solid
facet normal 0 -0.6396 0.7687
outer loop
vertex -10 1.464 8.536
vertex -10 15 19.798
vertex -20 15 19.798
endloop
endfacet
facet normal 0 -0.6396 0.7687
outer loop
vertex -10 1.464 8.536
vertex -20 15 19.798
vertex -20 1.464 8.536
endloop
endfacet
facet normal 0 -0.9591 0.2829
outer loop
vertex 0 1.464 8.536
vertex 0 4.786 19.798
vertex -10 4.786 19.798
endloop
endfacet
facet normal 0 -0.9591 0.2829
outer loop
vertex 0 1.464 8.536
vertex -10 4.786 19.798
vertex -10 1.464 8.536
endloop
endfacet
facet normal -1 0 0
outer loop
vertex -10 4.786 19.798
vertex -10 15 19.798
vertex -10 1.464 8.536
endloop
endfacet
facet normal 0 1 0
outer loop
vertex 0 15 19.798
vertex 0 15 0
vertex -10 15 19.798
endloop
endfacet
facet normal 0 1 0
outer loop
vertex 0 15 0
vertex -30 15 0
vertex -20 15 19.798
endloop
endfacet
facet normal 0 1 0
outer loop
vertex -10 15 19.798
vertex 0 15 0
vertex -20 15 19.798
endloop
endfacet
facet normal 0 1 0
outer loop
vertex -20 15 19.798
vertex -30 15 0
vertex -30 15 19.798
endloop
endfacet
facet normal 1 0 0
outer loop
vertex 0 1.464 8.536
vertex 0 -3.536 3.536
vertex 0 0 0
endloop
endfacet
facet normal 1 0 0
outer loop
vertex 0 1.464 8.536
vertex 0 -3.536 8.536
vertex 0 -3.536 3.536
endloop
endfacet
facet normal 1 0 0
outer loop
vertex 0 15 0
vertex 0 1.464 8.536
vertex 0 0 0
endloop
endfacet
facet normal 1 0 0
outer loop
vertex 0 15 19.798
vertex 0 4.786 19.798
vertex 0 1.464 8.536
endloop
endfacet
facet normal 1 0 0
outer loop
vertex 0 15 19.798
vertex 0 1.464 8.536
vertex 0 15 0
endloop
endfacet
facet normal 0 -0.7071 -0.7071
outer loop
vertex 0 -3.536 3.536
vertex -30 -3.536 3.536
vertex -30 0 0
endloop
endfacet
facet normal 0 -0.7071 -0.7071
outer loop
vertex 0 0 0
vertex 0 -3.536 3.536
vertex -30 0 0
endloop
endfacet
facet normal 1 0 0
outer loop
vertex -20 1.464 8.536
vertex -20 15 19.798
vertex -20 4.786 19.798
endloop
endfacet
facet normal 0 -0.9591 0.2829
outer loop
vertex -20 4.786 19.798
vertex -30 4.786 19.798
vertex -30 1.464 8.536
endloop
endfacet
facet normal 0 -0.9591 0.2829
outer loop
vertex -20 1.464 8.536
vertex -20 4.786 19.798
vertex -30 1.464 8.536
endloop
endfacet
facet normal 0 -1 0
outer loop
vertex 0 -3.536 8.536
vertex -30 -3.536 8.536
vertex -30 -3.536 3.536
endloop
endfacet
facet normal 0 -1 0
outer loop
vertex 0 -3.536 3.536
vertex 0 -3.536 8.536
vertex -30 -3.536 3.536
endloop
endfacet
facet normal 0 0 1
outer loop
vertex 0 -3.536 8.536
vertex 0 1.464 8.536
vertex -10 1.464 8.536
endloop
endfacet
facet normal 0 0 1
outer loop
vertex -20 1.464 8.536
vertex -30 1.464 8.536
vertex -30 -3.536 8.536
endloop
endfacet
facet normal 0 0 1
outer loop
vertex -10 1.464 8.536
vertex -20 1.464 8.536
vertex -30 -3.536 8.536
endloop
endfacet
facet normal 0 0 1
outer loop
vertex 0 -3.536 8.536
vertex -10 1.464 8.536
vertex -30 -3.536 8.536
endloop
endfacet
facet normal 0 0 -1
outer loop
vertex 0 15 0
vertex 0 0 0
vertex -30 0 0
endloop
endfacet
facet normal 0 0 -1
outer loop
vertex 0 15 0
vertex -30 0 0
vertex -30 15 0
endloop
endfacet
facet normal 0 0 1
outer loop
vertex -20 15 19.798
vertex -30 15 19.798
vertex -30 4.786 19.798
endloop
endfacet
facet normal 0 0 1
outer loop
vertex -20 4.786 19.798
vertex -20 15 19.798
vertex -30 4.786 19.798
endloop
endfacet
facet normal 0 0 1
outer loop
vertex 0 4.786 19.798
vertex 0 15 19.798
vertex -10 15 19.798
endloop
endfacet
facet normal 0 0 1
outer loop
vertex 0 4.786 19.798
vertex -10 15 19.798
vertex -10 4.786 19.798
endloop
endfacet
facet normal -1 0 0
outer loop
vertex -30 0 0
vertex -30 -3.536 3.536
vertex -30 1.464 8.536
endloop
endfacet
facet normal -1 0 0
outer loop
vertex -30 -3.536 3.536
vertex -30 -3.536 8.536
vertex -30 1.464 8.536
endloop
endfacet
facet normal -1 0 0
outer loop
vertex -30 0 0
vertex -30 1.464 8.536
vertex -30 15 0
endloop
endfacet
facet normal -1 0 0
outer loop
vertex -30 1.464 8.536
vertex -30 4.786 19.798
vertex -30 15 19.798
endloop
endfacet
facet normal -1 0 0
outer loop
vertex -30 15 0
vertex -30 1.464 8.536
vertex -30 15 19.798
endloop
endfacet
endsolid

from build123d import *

# Parameters (mm, degrees)
F1_DEPTH = 15
F3_DEPTH = 5


with BuildPart() as f1:
    # F0 (on Right) → F1 (new body)
    with BuildSketch(Plane.YZ):
        Polygon((-3.5355339059, 3.5355339059), (0, 0), (15, 0), (15, 19.7983665757), (4.7861494543, 19.7983665757), (1.4644660941, 8.5355339059), (-3.5355339059, 8.5355339059), align=None)
    extrude(amount=-F1_DEPTH)

    # F2 (on face) → F3 (cut)
    with BuildSketch(Plane(origin=(-15, 0, 0), x_dir=(0, -1, 0), z_dir=(-1, 0, 0))):
        Polygon((-4.7861494543, 19.7983665757), (-15, 19.7983665757), (-1.4644660941, 8.5355339059), align=None)
    extrude(amount=-F3_DEPTH, mode=Mode.SUBTRACT)

    # F6: F1 across plane


with BuildPart() as f1_1:
    add(f1.part)
    add(f1.part.mirror(Plane.YZ.offset(-15)))


solid = f1_1.part
